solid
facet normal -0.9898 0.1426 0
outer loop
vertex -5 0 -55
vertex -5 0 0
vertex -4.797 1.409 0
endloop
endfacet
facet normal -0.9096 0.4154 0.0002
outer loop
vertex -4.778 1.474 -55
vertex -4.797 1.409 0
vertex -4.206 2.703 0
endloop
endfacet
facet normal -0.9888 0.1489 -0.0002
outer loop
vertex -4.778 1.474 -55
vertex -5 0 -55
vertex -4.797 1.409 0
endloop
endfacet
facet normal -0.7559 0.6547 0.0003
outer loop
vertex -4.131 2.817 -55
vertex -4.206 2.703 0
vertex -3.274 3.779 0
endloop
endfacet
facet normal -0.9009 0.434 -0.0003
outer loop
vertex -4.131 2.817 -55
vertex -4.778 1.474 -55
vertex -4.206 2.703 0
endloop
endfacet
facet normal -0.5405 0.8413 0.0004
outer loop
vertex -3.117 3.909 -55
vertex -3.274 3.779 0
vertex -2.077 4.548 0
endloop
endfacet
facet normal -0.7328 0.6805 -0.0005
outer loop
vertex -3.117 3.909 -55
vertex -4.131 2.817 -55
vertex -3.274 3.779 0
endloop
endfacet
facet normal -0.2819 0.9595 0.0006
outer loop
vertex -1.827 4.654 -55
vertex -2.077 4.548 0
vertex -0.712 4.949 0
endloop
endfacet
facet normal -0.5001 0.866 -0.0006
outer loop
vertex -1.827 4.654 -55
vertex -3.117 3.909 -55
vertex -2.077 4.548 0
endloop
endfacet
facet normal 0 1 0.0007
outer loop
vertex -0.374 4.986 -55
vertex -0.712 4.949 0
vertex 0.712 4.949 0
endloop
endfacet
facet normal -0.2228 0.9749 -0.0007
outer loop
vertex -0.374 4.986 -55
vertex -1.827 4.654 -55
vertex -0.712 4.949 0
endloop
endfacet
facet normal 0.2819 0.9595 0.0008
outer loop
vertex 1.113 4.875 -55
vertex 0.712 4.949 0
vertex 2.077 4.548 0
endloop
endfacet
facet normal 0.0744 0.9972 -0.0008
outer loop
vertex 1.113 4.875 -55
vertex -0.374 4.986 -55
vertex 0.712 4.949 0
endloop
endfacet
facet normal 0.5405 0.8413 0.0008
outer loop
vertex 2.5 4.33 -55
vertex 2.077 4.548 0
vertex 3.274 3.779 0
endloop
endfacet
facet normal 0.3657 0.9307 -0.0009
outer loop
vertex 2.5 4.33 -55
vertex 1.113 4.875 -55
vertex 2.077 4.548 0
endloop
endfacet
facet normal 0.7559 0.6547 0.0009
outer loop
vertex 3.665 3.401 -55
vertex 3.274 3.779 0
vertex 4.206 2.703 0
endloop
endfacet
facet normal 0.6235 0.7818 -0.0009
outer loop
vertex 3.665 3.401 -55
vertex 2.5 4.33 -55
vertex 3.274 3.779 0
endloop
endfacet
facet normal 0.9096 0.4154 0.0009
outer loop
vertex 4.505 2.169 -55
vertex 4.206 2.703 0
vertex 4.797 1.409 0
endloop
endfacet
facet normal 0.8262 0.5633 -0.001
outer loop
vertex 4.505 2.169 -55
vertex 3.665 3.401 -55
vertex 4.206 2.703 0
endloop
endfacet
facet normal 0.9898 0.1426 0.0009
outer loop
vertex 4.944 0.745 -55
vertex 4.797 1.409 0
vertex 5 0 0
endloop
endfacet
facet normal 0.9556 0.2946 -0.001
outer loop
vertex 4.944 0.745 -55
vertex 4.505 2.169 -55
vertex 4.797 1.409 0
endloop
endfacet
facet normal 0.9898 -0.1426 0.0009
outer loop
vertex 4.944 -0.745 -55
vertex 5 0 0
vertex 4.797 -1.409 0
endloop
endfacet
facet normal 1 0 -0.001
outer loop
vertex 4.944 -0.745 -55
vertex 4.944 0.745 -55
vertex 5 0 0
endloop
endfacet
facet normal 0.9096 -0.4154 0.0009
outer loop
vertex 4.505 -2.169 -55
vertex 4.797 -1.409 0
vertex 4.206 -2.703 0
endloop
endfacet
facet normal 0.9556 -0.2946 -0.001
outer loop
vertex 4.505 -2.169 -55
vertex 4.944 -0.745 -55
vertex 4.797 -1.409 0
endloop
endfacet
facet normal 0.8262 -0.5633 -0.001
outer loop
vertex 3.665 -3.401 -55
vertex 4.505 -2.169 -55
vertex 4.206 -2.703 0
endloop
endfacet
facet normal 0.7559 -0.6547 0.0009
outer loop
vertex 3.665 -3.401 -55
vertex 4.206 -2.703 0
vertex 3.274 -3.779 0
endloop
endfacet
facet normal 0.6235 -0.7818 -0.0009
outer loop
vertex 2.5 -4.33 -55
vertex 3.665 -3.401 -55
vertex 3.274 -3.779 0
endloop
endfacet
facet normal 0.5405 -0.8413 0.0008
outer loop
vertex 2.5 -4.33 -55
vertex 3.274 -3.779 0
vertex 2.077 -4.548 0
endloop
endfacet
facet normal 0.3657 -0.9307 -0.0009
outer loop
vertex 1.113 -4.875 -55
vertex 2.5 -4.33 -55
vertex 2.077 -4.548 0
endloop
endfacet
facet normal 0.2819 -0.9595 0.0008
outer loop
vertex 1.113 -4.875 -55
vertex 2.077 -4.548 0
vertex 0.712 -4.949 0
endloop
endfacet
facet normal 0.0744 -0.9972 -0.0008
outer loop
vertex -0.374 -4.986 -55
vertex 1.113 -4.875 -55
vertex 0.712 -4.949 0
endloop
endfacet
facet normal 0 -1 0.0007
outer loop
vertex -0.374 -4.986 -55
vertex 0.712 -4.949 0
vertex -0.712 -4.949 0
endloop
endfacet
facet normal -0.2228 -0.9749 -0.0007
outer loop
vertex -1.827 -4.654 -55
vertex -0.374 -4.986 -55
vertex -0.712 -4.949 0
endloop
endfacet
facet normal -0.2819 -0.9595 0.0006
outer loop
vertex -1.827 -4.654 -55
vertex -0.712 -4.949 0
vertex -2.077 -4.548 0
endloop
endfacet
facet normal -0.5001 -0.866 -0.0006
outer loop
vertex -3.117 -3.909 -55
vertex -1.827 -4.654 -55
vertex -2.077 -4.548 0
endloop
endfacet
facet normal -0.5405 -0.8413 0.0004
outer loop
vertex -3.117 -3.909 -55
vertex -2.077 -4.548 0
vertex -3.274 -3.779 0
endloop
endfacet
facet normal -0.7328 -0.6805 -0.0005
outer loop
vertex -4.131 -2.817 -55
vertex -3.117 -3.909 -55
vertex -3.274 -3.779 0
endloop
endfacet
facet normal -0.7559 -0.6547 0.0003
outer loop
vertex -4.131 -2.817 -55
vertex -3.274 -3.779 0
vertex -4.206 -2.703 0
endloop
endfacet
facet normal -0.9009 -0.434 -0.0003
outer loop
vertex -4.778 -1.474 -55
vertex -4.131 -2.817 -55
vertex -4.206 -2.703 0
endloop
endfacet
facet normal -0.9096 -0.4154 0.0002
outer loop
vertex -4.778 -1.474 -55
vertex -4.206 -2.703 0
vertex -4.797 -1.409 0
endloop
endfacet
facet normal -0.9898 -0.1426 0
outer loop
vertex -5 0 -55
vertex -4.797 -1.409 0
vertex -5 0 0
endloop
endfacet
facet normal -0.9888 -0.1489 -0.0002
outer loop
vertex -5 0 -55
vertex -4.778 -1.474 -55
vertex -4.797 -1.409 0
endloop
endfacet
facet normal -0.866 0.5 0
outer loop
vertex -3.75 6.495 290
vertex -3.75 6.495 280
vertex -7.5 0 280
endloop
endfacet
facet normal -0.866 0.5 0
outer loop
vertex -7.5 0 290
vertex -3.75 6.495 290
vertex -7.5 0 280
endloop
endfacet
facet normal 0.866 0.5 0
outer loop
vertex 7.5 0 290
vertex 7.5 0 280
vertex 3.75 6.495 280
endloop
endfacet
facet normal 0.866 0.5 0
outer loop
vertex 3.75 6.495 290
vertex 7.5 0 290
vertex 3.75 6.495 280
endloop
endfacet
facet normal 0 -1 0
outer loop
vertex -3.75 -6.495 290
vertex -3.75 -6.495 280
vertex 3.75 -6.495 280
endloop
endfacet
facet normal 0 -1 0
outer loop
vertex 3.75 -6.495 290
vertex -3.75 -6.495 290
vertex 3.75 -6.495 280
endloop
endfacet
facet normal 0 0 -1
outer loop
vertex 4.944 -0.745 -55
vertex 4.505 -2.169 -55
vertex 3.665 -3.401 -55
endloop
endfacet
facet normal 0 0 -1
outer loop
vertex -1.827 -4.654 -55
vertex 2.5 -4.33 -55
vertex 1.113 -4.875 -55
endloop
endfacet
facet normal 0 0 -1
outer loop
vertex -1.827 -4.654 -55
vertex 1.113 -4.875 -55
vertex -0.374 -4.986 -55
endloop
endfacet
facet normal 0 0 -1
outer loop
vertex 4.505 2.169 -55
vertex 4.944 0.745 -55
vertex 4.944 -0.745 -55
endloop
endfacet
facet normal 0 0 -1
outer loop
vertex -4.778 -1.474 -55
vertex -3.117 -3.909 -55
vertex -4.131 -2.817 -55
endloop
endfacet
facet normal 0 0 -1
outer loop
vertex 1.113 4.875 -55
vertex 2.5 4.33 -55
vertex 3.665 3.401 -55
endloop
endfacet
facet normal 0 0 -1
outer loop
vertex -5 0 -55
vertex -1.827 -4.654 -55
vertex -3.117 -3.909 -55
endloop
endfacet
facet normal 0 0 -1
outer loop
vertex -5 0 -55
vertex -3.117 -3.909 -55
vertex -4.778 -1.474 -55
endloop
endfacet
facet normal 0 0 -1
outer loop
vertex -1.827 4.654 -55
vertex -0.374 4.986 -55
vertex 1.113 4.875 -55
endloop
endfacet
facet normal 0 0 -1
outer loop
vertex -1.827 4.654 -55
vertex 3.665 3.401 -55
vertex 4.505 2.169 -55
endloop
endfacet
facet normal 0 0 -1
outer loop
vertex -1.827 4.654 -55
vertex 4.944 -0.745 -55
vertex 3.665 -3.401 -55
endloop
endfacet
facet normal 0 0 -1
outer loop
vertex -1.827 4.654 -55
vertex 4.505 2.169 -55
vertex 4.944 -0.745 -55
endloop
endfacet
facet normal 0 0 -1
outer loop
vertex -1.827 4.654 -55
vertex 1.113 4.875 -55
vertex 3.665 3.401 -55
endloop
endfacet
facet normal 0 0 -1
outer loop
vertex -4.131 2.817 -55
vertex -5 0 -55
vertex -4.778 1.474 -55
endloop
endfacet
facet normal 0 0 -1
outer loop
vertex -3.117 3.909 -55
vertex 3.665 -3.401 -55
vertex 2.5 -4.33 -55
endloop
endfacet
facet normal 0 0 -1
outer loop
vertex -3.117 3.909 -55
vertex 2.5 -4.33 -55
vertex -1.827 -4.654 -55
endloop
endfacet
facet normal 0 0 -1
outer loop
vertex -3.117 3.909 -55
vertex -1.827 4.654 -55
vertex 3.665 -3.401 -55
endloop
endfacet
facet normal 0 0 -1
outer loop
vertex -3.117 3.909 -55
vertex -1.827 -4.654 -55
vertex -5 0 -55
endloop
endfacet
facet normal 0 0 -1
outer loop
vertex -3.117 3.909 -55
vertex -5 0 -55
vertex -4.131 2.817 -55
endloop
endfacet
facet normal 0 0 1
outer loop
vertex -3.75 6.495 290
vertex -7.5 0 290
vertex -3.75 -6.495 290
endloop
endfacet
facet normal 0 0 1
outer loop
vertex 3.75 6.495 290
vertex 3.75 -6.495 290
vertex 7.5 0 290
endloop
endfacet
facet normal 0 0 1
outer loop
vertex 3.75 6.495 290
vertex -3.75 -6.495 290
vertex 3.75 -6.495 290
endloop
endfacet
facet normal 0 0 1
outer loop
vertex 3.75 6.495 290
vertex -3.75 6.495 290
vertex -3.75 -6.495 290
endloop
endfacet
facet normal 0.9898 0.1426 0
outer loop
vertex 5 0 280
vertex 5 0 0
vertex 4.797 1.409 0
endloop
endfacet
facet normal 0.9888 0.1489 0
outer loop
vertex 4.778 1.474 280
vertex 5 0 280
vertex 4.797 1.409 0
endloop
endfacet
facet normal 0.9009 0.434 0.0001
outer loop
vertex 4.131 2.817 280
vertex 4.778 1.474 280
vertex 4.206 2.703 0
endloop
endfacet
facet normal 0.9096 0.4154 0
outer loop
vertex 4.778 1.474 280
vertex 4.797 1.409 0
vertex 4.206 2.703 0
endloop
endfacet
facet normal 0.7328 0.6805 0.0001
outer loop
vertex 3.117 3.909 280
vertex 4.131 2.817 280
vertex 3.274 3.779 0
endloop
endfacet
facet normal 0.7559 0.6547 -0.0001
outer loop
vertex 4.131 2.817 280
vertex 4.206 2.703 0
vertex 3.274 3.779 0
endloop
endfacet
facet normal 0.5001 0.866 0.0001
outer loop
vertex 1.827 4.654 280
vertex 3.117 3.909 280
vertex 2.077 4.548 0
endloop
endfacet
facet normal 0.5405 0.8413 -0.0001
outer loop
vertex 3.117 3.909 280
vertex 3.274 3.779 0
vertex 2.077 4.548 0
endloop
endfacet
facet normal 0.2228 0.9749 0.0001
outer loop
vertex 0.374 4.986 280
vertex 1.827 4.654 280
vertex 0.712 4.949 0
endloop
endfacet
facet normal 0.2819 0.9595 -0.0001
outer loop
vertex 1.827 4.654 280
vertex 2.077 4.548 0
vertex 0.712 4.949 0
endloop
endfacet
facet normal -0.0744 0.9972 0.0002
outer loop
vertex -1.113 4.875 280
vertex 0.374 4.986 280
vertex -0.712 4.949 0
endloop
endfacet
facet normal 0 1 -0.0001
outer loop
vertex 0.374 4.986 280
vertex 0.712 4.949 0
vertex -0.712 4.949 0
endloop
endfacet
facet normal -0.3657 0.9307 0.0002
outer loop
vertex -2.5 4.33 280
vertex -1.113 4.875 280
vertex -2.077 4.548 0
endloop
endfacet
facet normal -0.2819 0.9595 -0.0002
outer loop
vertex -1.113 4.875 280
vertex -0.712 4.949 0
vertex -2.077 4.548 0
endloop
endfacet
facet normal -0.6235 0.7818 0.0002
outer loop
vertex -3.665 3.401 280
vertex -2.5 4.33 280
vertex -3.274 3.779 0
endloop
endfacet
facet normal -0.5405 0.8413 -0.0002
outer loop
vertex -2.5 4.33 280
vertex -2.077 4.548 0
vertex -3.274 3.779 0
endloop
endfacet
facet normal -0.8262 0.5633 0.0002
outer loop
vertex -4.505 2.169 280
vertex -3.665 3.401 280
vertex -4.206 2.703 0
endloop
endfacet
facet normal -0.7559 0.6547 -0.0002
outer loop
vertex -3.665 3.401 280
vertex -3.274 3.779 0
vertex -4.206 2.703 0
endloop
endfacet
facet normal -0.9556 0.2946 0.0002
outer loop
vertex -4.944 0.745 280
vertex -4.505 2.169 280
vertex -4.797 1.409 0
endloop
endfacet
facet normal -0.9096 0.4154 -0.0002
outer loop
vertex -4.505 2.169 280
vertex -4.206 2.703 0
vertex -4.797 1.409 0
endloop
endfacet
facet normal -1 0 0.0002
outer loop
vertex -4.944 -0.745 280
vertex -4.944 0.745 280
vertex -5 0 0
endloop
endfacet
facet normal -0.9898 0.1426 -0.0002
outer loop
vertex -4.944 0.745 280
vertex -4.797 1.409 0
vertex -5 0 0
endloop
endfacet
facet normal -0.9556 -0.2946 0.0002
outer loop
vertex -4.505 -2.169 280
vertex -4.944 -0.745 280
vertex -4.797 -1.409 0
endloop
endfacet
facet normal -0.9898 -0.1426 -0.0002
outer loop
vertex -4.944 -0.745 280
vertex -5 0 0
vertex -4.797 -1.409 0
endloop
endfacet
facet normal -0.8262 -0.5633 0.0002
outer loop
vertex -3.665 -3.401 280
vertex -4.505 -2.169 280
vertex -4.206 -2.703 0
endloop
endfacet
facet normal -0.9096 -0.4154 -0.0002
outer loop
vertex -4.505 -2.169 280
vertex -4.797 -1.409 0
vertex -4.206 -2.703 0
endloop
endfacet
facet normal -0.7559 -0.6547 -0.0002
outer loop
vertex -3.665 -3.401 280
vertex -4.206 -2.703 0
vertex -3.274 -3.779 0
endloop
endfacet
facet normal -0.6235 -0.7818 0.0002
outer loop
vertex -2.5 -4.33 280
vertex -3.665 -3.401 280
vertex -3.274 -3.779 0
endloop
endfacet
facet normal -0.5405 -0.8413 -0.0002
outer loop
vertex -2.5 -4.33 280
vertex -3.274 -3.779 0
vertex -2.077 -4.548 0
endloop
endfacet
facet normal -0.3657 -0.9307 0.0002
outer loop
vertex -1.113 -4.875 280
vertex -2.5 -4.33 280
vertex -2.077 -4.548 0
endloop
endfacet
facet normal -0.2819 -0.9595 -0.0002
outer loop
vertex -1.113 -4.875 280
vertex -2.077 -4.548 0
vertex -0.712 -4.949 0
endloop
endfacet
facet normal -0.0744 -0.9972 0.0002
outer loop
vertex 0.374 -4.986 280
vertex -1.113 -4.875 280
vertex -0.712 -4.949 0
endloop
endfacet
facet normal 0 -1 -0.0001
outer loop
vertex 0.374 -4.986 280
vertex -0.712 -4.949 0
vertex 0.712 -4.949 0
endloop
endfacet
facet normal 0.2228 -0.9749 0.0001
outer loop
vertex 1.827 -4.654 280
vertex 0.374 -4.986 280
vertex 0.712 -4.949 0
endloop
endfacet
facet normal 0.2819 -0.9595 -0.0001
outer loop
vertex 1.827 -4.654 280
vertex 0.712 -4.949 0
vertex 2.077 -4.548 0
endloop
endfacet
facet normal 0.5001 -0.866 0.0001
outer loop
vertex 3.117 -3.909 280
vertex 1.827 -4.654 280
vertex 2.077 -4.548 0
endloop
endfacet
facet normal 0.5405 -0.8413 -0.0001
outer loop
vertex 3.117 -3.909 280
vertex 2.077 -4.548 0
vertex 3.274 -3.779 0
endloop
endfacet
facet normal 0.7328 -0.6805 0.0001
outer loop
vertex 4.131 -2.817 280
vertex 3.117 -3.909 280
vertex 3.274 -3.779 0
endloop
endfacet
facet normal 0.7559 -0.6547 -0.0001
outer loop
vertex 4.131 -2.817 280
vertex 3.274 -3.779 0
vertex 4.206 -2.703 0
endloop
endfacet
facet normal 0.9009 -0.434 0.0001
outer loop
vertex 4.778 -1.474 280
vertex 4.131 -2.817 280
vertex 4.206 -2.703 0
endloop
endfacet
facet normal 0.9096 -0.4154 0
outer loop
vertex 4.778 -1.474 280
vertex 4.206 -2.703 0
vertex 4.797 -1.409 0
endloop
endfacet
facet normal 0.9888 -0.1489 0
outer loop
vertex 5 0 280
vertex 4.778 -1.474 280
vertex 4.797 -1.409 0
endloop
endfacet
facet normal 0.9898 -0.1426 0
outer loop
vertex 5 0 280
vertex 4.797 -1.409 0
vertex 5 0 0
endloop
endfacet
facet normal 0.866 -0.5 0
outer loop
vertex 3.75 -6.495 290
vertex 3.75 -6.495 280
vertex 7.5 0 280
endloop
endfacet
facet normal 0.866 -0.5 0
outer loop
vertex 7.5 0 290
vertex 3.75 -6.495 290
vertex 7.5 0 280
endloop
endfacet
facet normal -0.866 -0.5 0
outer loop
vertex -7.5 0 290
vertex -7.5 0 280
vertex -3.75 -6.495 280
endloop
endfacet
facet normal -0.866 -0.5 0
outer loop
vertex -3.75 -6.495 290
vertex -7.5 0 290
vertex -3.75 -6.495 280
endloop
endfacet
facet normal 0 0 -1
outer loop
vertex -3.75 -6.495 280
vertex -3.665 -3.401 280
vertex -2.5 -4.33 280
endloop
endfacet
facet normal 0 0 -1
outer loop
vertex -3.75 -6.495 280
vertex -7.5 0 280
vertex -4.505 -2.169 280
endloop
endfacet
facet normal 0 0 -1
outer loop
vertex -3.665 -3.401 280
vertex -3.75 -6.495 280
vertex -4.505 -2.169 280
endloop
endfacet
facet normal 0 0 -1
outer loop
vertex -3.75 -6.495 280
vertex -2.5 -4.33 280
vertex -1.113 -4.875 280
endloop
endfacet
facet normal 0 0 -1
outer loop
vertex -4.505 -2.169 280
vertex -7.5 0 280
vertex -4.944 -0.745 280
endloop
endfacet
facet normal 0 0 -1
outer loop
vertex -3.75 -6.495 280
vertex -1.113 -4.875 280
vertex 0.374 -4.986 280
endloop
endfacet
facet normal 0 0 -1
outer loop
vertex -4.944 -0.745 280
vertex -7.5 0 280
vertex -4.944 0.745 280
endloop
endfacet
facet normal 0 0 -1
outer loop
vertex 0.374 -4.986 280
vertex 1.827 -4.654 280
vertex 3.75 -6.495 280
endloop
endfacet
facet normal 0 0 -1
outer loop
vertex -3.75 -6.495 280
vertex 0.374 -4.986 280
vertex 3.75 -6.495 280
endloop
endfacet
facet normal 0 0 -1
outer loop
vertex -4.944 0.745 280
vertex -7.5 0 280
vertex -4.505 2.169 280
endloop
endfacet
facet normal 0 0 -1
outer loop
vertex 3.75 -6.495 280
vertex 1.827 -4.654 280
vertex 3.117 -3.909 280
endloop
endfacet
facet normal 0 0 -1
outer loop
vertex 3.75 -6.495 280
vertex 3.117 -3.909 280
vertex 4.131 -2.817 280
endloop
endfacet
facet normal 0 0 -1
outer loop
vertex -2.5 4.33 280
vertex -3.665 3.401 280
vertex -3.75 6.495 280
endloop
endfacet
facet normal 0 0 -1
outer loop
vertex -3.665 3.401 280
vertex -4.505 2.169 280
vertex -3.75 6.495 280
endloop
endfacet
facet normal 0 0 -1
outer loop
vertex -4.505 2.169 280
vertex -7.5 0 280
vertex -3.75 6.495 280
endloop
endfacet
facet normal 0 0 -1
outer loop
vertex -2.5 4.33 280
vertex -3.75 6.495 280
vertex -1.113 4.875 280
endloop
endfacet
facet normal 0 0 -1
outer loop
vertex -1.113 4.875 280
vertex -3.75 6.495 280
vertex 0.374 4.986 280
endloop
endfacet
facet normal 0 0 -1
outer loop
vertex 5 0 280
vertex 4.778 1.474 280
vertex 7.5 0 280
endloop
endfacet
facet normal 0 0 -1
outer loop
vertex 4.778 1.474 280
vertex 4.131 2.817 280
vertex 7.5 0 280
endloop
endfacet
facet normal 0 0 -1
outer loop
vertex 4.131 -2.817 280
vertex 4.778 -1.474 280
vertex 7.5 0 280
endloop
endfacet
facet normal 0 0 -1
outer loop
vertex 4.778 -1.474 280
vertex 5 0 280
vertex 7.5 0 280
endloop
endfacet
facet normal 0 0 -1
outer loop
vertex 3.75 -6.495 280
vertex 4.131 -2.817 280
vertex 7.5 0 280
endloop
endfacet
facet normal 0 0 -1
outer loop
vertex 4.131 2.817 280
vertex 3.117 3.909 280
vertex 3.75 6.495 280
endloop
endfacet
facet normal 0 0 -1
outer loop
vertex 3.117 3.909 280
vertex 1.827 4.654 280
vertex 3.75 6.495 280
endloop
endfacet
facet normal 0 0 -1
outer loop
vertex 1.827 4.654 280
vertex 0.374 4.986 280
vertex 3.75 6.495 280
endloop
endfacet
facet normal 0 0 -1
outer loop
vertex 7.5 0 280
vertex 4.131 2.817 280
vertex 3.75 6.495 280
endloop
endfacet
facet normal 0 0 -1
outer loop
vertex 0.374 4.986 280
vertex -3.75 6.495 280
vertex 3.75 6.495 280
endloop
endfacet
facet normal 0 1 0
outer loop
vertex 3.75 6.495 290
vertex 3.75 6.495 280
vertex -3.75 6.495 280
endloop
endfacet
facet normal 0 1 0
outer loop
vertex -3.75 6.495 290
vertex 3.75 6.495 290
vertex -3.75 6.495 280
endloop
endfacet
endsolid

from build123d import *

# Parameters (mm, degrees)
SKETCH_1_R      = 5
EXTRUDE_1_DEPTH = 280
EXTRUDE_2_DEPTH = 10
EXTRUDE_START   = 55
SKETCH_3_R      = 5
EXTRUDE_3_DEPTH = 55


with BuildPart() as part:
    # 草图1 → 凸台-拉伸1 (new body)
    with BuildSketch(Plane.XY):
        Circle(SKETCH_1_R)
    extrude(amount=EXTRUDE_1_DEPTH)

    # 草图2 → 凸台-拉伸2 (add)
    with BuildSketch(Plane.XY.offset(280)):
        Polygon((3.75, -6.495190528), (7.5, 0), (3.75, 6.495190528), (-3.75, 6.495190528), (-7.5, 0), (-3.75, -6.495190528), align=None)
    extrude(amount=EXTRUDE_2_DEPTH)

    # 草图3 → 凸台-拉伸3 (add)
    with BuildSketch(Plane(origin=(0, 0, 0), x_dir=(-1, 0, 0), z_dir=(0, 0, -1)).offset(EXTRUDE_START)):
        Circle(SKETCH_3_R)
    extrude(amount=-EXTRUDE_3_DEPTH)


solid = part.part
